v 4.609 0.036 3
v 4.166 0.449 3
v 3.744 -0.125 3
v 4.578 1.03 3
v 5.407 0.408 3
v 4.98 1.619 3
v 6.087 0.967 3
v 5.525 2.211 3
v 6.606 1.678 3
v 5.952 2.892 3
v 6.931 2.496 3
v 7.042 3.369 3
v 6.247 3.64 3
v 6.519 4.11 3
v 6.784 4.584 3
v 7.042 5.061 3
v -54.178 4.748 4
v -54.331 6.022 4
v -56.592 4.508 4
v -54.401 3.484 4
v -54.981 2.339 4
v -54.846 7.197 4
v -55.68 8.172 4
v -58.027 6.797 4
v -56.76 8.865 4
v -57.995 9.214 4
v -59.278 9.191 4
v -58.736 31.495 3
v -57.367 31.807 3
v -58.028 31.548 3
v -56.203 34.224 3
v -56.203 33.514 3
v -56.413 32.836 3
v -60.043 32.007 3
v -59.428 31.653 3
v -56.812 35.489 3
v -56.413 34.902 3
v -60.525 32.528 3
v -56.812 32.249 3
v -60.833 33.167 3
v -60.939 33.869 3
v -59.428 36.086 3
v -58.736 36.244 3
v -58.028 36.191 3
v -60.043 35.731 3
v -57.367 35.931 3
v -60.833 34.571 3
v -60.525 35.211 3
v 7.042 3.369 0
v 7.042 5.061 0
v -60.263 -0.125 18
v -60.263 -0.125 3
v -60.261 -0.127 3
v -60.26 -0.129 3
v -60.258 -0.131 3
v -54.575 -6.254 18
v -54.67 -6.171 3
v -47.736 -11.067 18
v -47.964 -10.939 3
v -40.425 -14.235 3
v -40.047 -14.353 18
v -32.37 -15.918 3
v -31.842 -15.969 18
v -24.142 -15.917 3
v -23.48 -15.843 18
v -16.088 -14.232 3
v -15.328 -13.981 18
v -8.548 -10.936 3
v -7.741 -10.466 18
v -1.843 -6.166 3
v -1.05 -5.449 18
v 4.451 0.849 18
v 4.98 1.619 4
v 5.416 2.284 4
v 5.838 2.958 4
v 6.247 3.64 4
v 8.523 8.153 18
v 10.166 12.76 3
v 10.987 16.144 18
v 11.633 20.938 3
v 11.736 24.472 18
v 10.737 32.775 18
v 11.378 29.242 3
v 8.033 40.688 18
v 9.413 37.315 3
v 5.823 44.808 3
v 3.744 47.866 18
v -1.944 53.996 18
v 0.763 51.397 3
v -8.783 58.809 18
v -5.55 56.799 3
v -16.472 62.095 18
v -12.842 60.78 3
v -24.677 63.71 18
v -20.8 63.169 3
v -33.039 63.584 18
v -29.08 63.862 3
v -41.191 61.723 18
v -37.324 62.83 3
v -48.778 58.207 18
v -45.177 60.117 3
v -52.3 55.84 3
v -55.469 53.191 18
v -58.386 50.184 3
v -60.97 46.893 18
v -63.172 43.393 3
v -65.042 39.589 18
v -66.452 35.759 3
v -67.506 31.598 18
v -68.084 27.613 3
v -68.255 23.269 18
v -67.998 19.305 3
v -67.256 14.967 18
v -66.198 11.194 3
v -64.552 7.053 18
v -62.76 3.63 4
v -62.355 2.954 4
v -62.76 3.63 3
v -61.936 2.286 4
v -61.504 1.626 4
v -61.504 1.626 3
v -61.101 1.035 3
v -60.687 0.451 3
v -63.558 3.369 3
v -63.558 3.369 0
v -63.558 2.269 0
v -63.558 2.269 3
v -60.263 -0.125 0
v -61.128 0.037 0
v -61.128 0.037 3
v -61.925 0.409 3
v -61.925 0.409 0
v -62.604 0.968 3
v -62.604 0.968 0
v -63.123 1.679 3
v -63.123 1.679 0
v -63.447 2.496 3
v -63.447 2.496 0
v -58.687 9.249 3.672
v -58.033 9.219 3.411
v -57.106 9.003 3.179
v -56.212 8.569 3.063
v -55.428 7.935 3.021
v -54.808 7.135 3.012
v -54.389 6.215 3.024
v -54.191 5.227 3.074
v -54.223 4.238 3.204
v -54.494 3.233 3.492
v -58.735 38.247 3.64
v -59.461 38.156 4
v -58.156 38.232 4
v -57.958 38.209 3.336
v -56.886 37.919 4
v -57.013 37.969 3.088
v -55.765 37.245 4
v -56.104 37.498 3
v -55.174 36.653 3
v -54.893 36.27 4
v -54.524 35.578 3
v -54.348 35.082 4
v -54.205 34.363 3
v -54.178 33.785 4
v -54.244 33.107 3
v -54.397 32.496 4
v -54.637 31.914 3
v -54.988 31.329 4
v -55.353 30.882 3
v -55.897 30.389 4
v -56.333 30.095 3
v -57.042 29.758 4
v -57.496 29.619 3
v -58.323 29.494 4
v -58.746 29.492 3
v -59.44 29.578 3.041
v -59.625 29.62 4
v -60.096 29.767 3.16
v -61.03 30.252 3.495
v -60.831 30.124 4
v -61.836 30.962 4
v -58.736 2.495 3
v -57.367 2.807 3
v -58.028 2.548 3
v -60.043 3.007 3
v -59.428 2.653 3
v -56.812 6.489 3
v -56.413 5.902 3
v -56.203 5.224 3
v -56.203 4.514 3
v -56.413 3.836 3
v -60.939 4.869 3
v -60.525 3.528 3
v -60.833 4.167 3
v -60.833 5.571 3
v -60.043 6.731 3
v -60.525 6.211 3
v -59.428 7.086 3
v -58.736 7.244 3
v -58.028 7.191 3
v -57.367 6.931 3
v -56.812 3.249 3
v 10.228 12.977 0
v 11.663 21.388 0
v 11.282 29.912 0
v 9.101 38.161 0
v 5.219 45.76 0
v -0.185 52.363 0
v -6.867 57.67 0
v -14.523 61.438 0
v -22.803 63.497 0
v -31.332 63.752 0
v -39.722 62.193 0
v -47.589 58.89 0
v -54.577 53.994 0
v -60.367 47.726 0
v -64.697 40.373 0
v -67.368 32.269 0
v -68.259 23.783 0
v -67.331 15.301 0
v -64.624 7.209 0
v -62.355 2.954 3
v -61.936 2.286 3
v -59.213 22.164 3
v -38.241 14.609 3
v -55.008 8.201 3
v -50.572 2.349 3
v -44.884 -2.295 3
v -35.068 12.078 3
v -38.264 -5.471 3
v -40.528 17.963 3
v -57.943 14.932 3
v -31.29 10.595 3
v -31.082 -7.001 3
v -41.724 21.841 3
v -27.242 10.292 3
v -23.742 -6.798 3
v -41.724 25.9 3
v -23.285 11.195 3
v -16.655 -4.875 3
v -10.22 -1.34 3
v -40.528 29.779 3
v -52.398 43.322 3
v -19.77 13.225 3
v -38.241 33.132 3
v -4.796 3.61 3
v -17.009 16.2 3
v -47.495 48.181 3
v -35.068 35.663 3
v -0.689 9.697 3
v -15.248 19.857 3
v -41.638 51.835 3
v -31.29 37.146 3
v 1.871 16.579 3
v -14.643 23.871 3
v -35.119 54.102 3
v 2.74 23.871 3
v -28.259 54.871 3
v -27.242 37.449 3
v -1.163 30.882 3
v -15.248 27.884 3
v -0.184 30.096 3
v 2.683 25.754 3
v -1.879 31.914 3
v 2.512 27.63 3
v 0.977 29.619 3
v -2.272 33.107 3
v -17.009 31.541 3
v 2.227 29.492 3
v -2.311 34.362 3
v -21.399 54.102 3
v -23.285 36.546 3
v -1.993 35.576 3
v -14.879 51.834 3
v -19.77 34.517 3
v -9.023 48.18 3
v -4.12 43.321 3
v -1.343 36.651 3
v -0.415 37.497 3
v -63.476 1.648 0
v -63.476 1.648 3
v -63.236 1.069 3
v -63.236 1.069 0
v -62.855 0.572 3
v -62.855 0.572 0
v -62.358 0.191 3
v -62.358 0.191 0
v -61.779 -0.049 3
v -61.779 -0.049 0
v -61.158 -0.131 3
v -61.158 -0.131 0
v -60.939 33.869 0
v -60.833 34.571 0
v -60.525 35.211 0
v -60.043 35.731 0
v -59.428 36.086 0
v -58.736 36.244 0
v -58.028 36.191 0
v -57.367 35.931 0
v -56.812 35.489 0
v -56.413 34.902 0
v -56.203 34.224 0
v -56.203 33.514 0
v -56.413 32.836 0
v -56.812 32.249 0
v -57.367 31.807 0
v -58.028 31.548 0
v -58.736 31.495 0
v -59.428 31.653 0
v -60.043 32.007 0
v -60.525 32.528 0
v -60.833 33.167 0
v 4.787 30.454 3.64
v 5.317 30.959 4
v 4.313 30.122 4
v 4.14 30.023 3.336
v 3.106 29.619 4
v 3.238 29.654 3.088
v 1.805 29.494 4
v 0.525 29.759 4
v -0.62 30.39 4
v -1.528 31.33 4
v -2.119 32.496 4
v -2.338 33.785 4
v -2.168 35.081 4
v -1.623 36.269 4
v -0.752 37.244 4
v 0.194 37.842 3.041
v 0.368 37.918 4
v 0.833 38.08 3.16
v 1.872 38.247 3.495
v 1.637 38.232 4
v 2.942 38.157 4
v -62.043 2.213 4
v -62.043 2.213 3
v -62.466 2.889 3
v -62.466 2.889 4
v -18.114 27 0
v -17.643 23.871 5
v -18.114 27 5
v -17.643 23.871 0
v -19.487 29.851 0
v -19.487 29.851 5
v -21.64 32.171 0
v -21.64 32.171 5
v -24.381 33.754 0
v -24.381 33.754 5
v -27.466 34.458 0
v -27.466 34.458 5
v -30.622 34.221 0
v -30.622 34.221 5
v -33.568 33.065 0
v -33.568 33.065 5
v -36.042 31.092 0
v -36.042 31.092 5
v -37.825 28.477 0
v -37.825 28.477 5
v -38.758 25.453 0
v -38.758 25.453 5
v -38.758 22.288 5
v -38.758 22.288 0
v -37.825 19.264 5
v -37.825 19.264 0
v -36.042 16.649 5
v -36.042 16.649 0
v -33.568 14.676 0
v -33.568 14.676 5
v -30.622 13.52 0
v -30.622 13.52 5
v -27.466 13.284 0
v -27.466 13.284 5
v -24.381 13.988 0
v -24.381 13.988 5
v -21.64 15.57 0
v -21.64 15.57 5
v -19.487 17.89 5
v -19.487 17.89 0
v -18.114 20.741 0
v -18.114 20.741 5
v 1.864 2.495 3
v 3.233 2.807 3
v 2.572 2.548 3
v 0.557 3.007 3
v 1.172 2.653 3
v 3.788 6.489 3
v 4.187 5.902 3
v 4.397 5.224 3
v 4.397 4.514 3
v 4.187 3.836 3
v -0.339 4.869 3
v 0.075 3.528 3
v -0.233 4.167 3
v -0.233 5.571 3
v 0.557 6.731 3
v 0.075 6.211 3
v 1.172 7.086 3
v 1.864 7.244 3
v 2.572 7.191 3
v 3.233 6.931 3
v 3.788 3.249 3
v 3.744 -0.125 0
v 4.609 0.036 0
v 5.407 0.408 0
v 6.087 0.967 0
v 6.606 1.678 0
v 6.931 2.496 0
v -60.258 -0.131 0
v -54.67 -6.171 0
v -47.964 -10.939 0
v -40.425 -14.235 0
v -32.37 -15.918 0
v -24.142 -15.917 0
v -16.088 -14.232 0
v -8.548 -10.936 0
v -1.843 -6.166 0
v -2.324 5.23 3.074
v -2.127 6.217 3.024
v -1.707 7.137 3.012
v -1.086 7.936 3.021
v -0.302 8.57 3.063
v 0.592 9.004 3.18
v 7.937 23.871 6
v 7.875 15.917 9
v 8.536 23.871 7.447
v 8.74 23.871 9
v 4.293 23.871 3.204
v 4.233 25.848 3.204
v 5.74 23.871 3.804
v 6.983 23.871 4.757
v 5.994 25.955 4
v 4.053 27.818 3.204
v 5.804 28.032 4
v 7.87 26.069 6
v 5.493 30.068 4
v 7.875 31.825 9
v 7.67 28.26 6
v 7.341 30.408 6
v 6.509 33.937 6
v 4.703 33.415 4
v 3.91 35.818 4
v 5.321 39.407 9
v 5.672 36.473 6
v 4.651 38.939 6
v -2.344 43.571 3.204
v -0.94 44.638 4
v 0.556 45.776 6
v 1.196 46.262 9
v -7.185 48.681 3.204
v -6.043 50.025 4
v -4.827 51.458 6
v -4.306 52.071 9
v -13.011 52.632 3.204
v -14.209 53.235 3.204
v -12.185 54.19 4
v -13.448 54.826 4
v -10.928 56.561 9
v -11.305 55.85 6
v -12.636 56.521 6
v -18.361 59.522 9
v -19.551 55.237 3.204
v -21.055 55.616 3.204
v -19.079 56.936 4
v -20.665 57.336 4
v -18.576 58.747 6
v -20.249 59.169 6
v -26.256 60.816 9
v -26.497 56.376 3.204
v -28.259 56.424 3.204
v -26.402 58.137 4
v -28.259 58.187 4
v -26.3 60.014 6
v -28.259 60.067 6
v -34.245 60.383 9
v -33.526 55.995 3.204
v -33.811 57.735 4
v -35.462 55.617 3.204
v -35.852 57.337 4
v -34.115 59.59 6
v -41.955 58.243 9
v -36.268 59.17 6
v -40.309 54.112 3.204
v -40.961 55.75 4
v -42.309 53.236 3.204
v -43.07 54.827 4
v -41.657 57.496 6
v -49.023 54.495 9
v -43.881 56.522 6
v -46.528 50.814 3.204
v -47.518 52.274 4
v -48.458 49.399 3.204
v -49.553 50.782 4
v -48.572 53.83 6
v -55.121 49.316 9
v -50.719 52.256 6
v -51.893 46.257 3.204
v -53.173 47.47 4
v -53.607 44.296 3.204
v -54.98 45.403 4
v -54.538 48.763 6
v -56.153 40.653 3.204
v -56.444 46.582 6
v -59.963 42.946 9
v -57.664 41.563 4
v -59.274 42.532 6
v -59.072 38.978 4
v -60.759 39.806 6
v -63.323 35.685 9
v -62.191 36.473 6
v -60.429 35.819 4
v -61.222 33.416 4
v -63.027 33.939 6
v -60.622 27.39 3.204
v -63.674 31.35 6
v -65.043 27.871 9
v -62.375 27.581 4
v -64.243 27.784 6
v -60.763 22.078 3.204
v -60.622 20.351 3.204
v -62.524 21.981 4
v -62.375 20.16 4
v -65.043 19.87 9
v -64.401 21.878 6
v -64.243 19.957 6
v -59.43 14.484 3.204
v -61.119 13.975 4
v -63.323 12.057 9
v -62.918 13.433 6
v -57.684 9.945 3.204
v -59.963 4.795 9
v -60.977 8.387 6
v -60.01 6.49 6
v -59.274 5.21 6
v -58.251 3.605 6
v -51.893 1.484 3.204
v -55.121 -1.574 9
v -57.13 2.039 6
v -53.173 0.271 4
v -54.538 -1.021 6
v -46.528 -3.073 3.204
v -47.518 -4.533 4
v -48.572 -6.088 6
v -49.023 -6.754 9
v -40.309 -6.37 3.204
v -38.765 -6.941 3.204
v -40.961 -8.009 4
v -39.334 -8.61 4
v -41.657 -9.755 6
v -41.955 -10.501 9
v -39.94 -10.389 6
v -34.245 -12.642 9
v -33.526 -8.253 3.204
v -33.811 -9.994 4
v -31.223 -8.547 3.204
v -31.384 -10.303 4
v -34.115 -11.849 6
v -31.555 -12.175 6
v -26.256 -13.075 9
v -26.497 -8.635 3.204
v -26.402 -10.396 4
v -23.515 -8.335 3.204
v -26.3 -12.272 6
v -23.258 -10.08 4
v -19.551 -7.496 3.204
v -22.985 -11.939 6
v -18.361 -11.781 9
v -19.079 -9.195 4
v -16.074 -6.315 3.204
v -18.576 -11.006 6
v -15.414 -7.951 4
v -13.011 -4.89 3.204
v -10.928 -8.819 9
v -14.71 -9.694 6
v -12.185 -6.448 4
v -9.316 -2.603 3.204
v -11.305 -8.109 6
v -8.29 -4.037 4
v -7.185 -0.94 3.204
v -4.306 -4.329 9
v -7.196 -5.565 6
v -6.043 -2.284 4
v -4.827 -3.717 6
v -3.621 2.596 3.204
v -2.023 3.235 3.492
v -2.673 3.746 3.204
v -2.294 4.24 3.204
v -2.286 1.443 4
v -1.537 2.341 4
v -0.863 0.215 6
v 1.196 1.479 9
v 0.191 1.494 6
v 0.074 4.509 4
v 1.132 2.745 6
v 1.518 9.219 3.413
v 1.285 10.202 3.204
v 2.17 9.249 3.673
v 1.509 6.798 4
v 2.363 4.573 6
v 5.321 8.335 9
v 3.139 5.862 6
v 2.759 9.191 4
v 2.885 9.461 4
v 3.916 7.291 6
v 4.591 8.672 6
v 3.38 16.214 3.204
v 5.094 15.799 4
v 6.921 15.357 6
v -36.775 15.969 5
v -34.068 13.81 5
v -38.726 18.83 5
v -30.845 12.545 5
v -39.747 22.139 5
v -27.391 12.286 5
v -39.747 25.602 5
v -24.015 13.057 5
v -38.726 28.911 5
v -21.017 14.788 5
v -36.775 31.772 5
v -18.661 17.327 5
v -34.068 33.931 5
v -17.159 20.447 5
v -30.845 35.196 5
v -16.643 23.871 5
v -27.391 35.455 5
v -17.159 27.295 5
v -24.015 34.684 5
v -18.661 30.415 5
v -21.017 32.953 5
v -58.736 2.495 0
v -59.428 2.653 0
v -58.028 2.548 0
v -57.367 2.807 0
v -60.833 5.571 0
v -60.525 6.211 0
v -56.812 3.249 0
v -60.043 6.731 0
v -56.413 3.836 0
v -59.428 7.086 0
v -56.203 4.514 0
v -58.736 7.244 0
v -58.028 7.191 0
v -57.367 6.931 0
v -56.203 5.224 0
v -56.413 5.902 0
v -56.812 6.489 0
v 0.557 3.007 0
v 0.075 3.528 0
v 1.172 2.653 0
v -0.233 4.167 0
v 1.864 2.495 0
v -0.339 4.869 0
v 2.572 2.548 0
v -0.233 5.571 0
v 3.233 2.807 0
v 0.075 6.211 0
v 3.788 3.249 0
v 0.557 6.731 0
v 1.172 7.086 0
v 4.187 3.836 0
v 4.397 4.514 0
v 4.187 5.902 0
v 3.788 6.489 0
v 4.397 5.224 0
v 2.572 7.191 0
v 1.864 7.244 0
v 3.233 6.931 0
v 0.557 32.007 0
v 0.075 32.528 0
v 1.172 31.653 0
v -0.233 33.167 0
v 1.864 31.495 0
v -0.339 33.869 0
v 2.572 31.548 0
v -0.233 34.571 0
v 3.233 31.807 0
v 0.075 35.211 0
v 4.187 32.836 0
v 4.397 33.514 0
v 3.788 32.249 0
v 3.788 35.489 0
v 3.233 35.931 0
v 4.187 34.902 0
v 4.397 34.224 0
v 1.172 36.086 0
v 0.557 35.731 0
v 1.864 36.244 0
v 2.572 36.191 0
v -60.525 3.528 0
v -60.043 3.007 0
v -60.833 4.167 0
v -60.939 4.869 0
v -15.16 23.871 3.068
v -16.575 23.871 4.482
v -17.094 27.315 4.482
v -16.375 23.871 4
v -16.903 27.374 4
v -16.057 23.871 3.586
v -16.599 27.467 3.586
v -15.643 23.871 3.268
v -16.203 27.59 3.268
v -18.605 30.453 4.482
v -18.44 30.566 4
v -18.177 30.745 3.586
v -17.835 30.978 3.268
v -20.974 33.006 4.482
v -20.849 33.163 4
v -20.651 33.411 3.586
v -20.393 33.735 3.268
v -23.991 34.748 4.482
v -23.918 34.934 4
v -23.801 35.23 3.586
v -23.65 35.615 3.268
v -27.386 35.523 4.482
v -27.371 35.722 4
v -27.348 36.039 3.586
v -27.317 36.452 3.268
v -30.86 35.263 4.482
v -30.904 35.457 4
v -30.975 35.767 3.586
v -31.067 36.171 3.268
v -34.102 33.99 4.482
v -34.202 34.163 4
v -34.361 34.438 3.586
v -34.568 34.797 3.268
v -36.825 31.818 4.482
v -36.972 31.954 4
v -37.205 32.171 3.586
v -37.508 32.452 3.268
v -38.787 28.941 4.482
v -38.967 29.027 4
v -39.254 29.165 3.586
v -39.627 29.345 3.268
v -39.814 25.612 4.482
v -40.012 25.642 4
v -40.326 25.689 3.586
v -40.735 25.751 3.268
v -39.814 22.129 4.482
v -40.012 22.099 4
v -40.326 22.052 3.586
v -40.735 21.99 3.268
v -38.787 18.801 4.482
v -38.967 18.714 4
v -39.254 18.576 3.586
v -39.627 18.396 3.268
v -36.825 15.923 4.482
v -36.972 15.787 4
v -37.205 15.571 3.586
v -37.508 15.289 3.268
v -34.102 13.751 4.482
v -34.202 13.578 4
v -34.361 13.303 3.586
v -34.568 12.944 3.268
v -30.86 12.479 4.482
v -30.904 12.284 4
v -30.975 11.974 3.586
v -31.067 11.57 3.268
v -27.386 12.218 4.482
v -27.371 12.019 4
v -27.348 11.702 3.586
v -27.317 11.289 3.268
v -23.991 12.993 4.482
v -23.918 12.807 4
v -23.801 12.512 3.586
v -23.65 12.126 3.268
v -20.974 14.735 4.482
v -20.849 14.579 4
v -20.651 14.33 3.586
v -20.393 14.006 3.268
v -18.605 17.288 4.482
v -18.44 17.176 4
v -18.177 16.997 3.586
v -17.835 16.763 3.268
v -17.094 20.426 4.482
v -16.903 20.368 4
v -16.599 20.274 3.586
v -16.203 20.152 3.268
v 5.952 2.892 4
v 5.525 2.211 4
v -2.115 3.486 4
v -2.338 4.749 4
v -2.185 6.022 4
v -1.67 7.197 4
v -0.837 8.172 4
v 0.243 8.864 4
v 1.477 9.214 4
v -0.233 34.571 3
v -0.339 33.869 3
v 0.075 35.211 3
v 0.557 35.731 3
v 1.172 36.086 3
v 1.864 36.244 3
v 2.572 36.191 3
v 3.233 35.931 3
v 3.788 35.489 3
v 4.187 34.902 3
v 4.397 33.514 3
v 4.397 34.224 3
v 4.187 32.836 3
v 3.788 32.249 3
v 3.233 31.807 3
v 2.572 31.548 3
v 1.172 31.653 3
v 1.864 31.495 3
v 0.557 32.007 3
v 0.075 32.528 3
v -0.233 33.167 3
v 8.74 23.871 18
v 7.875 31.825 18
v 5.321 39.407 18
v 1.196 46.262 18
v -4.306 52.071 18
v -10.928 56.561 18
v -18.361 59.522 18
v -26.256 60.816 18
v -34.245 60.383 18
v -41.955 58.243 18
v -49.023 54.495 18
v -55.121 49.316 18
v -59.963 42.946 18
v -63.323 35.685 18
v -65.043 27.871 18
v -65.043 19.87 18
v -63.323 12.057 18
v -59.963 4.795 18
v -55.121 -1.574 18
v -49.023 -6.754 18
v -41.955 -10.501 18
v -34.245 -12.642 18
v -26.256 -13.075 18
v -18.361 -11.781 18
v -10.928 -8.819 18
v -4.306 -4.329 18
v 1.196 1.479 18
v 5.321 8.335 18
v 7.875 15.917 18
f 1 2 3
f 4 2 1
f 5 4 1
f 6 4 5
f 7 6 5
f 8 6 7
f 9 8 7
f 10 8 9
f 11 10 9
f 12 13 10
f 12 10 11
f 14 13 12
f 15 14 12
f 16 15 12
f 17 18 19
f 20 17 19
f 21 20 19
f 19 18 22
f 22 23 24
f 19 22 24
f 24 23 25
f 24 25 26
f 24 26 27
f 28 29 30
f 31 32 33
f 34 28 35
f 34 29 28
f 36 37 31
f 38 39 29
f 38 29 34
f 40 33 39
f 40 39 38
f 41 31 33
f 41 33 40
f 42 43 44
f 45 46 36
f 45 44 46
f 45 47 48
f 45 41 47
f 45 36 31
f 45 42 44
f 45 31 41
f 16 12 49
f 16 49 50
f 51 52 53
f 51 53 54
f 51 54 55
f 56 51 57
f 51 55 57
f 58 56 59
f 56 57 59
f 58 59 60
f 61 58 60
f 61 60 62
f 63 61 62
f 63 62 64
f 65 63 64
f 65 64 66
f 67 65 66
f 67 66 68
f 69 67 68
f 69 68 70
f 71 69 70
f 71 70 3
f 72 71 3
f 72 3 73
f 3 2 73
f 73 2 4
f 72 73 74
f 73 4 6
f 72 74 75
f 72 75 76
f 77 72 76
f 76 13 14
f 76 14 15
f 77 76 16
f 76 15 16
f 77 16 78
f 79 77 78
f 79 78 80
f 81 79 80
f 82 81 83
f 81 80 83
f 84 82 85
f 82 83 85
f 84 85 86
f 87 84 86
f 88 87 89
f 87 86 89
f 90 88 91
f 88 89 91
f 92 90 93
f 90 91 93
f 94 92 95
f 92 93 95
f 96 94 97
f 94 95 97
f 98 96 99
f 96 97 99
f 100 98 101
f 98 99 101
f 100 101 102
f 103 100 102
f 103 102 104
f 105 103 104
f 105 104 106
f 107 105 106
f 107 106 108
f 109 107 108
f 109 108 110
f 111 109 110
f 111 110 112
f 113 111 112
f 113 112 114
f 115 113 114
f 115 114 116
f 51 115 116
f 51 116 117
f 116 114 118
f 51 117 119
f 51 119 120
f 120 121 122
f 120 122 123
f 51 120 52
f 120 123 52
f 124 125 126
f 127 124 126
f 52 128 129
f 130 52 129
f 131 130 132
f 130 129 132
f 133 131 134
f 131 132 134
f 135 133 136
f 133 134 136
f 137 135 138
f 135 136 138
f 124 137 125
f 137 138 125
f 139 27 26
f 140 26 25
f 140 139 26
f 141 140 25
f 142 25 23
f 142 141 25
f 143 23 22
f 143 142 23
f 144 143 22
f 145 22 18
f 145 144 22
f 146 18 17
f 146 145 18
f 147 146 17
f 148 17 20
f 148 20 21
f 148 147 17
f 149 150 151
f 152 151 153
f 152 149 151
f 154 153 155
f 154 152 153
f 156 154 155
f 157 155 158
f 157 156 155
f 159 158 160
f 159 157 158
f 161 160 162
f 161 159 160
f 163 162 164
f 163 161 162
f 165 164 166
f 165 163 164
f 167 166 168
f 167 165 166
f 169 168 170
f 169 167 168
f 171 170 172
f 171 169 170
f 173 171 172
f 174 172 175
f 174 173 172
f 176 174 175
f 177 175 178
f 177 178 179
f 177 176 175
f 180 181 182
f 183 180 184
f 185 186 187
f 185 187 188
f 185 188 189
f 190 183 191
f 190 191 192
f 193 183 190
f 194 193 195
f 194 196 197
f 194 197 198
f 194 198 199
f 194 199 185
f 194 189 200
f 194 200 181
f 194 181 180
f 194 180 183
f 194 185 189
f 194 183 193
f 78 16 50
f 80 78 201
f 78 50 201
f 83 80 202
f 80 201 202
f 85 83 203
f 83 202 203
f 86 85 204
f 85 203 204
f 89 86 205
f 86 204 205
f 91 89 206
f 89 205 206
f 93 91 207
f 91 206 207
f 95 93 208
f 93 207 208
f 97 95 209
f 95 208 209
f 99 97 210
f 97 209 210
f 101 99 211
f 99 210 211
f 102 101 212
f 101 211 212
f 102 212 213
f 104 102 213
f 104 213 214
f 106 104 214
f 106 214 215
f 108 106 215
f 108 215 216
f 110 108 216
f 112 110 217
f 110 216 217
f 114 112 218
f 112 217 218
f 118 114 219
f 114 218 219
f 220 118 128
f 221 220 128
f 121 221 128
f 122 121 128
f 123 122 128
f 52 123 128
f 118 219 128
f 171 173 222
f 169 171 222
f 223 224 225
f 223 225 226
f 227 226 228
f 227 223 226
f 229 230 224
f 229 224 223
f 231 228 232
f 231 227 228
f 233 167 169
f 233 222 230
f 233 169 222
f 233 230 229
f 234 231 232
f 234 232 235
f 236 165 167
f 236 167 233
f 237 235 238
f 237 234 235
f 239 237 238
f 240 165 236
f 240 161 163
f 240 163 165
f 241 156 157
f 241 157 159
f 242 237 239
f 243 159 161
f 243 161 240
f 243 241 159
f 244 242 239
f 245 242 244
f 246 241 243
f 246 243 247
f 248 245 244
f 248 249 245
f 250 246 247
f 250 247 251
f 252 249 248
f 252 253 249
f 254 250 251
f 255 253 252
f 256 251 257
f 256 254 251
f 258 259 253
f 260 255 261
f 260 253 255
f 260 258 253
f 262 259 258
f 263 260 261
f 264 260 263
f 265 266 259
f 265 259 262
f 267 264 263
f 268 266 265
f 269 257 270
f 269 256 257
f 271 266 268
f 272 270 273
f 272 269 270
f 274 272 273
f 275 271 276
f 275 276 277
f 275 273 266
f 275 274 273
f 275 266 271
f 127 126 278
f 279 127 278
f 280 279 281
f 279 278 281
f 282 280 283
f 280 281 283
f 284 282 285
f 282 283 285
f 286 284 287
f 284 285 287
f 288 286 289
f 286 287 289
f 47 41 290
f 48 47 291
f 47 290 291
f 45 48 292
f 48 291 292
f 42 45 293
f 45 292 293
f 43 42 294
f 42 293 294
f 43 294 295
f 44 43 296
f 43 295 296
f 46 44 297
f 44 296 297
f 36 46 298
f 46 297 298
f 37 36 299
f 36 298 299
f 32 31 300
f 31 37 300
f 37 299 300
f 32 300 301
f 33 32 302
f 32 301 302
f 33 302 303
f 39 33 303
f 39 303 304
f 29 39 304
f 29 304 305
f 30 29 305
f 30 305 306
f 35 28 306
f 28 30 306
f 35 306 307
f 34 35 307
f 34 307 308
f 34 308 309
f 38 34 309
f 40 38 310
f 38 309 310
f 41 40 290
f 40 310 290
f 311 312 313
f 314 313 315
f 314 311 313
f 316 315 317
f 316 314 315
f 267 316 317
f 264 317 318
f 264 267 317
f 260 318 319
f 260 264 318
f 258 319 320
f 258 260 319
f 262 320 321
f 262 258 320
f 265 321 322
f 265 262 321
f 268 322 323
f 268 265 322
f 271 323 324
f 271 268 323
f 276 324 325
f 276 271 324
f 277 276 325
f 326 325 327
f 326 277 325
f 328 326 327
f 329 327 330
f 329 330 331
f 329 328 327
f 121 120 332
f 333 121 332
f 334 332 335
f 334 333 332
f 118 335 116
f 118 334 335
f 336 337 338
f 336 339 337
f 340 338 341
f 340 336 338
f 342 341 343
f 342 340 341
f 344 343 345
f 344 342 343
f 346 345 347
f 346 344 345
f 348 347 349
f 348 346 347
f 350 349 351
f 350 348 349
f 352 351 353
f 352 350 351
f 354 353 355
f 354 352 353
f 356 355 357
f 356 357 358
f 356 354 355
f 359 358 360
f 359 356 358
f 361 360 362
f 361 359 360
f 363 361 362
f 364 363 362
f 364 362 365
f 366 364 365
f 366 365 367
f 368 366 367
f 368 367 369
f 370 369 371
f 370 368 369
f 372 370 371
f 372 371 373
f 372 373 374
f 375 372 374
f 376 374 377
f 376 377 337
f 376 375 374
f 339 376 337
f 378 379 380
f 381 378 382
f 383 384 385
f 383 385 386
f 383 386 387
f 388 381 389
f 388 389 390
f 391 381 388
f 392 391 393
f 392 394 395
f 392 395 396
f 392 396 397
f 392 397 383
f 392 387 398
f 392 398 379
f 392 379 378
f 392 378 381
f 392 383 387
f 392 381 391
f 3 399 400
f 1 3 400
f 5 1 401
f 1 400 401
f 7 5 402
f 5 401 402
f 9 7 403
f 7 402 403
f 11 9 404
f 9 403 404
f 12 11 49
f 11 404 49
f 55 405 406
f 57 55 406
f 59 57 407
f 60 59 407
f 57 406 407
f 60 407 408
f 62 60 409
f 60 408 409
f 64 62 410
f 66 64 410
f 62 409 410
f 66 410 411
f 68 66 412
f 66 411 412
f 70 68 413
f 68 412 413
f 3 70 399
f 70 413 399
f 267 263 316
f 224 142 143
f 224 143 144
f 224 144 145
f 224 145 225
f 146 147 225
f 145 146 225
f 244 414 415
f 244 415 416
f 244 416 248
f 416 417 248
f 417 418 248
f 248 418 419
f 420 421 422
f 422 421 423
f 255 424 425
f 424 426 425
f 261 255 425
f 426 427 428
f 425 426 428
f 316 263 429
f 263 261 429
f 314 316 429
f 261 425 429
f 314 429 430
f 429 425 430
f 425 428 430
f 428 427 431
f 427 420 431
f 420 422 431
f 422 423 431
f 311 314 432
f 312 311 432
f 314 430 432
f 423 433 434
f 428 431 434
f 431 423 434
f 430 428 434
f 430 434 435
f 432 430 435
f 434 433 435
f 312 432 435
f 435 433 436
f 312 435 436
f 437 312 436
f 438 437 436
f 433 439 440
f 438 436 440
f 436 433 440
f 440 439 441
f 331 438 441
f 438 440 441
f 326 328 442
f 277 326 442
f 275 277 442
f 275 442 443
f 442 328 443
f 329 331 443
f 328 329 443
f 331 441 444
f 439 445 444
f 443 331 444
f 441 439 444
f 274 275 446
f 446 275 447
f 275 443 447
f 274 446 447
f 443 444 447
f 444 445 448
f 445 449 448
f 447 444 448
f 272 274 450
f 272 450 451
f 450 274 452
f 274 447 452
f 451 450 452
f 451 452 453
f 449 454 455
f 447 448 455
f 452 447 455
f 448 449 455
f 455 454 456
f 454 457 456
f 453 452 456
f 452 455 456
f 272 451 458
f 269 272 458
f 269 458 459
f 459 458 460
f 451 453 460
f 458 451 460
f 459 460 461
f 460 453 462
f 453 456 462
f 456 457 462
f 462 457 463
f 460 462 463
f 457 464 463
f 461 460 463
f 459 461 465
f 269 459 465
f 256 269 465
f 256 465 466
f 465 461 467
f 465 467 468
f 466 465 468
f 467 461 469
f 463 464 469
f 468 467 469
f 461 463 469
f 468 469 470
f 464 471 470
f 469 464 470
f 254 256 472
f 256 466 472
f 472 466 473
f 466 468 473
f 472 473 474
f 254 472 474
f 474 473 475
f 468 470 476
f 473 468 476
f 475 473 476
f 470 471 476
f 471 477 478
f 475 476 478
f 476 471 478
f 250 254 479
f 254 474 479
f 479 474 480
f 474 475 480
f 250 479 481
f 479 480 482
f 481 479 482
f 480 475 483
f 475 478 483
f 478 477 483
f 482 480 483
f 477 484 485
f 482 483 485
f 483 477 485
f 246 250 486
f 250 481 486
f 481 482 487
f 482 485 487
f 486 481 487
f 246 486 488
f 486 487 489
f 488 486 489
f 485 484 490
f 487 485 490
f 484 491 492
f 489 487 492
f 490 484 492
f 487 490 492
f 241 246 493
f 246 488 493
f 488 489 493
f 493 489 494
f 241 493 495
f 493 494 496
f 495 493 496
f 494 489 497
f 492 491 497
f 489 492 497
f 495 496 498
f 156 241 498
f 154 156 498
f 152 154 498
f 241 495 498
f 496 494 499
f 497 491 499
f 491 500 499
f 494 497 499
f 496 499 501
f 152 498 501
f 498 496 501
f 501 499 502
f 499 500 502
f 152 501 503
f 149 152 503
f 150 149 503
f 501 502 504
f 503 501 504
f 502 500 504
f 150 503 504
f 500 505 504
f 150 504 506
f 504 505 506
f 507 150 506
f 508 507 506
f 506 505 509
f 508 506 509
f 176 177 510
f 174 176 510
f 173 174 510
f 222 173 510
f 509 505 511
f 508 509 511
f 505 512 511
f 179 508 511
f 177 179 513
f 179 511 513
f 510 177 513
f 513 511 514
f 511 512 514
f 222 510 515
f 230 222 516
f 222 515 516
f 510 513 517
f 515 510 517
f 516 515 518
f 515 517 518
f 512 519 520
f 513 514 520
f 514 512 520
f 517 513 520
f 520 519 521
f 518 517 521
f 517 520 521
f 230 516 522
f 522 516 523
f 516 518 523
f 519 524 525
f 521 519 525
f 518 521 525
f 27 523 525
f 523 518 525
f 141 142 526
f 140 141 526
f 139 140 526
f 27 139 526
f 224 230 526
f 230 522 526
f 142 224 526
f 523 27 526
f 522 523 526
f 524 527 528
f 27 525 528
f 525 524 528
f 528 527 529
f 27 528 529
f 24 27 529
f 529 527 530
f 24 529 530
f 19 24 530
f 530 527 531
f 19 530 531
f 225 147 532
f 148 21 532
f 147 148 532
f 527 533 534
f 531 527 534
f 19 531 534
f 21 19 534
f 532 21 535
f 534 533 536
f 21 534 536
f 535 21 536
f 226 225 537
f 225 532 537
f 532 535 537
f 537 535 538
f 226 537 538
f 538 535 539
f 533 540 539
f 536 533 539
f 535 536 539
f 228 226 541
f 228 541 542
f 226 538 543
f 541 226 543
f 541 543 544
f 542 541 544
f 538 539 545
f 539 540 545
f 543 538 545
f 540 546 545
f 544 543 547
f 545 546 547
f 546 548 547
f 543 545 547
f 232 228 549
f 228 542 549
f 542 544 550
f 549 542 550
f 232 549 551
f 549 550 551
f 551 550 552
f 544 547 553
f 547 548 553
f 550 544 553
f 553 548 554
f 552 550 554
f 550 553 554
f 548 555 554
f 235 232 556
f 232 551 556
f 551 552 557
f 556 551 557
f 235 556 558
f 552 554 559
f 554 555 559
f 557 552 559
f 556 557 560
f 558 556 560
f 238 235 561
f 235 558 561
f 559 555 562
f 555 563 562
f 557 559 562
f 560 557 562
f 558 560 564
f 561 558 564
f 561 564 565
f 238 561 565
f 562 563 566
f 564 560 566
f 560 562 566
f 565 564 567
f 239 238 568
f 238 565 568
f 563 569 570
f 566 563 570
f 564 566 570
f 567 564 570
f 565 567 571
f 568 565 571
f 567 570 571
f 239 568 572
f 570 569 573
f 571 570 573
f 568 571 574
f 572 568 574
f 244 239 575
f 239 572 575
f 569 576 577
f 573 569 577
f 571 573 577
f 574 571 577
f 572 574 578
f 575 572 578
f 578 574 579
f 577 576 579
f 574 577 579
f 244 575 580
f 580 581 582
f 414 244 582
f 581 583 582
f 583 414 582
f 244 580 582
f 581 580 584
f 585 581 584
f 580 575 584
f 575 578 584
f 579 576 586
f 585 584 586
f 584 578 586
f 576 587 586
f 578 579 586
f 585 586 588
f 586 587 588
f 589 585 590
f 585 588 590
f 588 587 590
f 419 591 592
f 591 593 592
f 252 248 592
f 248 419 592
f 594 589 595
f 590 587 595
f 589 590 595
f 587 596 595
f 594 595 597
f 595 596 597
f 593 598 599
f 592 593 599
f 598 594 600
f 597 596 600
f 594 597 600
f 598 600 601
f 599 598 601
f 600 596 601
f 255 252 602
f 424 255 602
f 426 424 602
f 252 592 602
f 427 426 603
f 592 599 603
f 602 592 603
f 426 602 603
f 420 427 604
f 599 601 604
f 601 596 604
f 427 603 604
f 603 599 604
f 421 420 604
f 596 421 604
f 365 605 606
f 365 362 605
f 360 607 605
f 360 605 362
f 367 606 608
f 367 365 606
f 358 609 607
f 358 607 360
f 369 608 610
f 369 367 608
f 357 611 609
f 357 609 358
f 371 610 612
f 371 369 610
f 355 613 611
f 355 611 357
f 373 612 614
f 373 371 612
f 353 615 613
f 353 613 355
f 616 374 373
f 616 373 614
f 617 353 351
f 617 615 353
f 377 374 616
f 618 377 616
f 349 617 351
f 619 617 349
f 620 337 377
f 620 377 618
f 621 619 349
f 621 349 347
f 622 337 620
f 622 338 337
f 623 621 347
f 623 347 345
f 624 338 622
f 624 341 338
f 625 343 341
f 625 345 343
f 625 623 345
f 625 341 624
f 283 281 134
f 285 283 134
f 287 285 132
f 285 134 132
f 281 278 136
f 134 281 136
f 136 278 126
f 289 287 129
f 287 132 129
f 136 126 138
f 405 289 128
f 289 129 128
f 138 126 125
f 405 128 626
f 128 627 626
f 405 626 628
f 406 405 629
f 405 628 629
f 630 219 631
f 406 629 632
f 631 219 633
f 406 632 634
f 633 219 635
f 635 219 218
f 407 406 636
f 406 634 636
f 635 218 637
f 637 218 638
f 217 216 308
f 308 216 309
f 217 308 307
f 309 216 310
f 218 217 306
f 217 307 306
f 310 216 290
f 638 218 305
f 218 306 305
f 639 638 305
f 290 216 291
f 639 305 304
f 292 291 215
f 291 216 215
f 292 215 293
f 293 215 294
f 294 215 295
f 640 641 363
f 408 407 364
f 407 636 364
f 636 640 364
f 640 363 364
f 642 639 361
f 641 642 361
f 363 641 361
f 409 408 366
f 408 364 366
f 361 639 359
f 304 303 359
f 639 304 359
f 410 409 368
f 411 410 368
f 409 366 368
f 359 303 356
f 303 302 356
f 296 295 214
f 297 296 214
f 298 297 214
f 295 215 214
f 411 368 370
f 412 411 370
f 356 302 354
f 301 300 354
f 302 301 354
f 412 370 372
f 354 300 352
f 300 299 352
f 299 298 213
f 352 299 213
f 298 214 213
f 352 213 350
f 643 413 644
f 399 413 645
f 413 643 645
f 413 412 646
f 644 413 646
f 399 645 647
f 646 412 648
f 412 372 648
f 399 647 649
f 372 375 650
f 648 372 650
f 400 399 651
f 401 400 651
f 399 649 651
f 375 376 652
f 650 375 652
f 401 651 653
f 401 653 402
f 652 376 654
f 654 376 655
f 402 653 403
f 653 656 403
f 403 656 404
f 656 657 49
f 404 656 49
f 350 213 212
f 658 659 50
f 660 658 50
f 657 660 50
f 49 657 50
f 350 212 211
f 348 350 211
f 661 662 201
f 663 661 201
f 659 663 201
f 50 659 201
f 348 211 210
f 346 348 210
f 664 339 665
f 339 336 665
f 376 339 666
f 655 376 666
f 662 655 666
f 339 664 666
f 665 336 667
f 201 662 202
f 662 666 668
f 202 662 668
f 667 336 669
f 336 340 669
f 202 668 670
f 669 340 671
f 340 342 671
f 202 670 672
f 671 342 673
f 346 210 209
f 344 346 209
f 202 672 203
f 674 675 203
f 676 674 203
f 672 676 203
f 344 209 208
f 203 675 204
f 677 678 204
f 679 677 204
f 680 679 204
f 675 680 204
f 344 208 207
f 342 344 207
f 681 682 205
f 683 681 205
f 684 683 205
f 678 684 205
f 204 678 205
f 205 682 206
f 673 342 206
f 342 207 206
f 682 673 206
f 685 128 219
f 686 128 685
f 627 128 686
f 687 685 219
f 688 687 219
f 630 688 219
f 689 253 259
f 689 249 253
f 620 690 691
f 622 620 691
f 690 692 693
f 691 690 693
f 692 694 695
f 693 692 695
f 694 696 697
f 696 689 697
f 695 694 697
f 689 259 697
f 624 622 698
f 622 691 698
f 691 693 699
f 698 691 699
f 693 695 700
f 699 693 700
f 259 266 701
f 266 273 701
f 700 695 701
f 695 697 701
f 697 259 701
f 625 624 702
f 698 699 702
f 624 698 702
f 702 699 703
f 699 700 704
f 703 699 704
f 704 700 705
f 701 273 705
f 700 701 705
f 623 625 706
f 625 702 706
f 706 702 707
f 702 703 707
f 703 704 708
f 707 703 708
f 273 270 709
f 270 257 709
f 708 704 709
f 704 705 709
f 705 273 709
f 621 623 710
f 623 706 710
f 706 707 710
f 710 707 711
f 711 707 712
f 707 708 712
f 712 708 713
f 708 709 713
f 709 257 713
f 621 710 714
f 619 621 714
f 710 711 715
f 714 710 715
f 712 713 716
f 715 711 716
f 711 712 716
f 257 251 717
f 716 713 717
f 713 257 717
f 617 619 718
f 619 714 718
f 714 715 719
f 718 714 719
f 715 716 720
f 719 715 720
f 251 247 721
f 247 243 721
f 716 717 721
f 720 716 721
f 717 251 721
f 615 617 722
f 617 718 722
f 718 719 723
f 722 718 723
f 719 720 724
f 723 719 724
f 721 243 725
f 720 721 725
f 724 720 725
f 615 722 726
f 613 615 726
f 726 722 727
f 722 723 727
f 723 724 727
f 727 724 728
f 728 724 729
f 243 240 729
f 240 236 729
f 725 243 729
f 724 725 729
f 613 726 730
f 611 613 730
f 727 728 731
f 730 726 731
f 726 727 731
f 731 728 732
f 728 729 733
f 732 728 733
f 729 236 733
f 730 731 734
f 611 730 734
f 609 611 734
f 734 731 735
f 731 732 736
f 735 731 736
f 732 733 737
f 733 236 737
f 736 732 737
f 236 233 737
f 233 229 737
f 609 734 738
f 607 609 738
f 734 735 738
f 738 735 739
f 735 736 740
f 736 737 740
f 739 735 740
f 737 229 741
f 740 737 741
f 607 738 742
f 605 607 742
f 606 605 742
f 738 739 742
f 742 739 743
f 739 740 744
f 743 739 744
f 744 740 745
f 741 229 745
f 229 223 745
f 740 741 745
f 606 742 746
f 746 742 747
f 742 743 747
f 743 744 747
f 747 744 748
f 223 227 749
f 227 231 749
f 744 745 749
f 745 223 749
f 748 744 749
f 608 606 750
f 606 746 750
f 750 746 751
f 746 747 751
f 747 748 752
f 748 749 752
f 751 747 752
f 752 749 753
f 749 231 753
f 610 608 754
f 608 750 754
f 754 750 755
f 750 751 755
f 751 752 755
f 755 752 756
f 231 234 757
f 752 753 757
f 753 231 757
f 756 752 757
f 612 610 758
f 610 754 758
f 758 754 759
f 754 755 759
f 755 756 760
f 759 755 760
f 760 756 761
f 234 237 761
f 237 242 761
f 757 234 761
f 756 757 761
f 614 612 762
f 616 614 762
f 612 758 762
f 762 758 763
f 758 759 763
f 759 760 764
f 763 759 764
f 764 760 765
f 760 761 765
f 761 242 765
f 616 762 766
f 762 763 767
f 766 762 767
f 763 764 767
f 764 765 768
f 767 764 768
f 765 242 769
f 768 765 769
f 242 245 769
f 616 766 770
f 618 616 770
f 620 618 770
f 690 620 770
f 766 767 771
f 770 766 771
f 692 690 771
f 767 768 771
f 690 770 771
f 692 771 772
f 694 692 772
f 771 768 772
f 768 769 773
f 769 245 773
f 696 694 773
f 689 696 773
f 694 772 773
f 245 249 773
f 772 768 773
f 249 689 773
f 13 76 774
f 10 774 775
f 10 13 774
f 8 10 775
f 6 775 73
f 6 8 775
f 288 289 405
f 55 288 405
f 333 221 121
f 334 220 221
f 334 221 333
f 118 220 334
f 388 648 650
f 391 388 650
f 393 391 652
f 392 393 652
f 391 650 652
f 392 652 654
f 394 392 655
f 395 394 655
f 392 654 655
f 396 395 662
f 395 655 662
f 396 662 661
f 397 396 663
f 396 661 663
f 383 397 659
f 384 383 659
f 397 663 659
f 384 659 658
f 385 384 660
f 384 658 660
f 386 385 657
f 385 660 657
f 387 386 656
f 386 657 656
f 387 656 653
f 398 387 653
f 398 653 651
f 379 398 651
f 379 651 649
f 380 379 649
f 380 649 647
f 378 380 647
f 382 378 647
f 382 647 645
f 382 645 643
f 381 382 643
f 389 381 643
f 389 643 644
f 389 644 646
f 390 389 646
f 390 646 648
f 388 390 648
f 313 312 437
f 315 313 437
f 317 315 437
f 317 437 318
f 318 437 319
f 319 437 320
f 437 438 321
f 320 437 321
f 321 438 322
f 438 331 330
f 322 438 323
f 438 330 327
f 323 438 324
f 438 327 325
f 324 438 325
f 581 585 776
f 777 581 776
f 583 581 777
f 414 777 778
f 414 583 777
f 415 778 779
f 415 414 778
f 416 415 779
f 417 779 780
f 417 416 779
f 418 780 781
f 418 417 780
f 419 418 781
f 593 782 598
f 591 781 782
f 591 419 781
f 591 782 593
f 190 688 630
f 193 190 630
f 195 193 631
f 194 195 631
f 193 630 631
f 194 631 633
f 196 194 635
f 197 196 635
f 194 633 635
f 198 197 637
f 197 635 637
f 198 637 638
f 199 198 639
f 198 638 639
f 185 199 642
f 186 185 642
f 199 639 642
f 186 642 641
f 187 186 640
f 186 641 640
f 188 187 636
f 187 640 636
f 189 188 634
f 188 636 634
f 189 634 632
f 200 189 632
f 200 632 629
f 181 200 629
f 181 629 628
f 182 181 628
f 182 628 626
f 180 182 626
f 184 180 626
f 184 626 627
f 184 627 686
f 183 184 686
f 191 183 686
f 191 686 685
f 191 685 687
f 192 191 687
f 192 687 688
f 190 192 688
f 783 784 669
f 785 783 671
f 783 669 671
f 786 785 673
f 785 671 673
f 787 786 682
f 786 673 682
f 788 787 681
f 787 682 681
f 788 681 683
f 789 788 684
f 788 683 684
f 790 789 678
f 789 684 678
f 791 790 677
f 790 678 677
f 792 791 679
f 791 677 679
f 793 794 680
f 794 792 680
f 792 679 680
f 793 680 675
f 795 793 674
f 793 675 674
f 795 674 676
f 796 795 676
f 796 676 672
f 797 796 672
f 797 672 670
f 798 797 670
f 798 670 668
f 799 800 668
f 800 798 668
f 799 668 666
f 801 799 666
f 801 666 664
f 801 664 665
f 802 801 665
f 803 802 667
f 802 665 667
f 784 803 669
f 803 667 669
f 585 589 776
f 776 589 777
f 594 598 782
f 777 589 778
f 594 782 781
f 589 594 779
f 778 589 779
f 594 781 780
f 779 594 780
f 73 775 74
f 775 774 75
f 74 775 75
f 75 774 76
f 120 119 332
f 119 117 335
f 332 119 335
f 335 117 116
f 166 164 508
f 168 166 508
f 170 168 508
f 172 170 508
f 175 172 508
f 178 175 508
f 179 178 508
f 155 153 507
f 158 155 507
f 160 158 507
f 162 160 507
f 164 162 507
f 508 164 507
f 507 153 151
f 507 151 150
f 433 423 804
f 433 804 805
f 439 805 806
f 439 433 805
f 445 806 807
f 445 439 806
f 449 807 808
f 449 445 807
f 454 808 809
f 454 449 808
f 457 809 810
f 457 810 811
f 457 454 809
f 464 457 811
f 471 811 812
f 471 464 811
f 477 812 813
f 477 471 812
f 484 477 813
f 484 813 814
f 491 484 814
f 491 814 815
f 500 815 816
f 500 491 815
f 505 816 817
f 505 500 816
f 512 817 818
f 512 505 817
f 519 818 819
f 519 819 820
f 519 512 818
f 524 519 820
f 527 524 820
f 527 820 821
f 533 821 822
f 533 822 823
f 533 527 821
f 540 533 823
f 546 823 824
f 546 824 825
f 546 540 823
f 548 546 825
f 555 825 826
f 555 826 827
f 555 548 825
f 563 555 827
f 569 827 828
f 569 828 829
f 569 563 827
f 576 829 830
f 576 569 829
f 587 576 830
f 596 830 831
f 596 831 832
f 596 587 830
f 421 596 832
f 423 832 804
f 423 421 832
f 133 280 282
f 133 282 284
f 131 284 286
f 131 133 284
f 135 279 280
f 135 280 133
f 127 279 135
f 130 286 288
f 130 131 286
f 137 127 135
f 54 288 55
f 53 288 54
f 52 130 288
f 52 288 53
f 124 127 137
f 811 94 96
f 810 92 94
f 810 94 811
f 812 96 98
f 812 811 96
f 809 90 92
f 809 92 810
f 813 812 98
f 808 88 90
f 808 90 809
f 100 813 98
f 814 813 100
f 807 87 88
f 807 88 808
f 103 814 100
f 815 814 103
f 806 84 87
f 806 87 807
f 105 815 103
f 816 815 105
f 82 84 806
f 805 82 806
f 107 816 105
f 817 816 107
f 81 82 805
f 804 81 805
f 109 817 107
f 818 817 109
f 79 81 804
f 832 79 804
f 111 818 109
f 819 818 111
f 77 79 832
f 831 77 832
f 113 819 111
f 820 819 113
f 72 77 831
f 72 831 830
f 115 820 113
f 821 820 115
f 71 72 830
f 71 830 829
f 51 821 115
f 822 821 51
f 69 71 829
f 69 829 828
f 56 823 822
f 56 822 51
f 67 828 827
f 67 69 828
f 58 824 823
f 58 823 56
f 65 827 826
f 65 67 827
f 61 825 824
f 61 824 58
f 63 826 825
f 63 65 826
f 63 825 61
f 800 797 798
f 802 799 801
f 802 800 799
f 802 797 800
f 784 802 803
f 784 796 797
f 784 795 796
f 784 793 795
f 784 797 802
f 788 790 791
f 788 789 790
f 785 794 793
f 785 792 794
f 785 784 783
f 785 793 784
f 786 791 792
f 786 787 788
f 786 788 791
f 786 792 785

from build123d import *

# Parameters (mm, degrees)
BOSS_EXTRUDE1_OUTLINE_R = 10.616834944
BOSS_EXTRUDE1_DEPTH     = 3
SKETCH3_R               = 40
SKETCH3_R_2             = 37
BOSS_EXTRUDE2_DEPTH     = 15
SKETCH4_R               = 11.616834944
SKETCH4_R_2             = 10.616834944
BOSS_EXTRUDE3_DEPTH     = 2
FILLET2_R               = 2
FILLET3_R               = 6
SKETCH6_R               = 2.38125
CUT_EXTRUDE1_DEPTH      = 3.175
SKETCH8_R               = 4.38125
BOSS_EXTRUDE5_DEPTH     = 1


# Read off the part's stored shape, not the designer's step: Boss-Extrude1
with BuildPart() as part:
    # Boss-Extrude1 outline → Boss-Extrude1 (new body)
    with BuildSketch(Plane.XY):
        with BuildLine():
            Line((-61.158014619, -0.130841154), (-60.258391765, -0.130841154))
            ThreePointArc((-60.258391765, -0.130841154), (-28.255886619, -16.129333036), (3.743709339, -0.125023097))
            ThreePointArc((3.743709339, -0.125023097), (6.087180251, 0.966663669), (7.041985381, 3.369158846))
            Line((7.041985381, 3.369158846), (7.041985381, 5.061001168))
            ThreePointArc((7.041985381, 5.061001168), (-31.332414811, 63.752458818), (-60.262892503, -0.124839588))
            ThreePointArc((-60.262892503, -0.124839588), (-62.604293531, 0.967812618), (-63.558014619, 3.369158846))
            Line((-63.558014619, 3.369158846), (-63.558014619, 2.269158846))
            ThreePointArc((-63.558014619, 2.269158846), (-62.855070894, 0.572102571), (-61.158014619, -0.130841154))
        make_face()
        with Locations((-28.259522786, 23.870666799)):
            Circle(BOSS_EXTRUDE1_OUTLINE_R, mode=Mode.SUBTRACT)
    extrude(amount=BOSS_EXTRUDE1_DEPTH)

    # Sketch3 → Boss-Extrude2 (add)
    with BuildSketch(Plane.XY.offset(3)):
        with Locations(Location((-28.259522786, 23.870666799, 0), (0, 0, 216.861852286))):
            Circle(SKETCH3_R)
        with Locations((-28.259522786, 23.870666799)):
            Circle(SKETCH3_R_2, mode=Mode.SUBTRACT)
    extrude(amount=BOSS_EXTRUDE2_DEPTH)

    # Sketch4 → Boss-Extrude3 (add)
    with BuildSketch(Plane.XY.offset(3)):
        with Locations((-28.259522786, 23.870666799)):
            Circle(SKETCH4_R)
        with Locations((-28.259522786, 23.870666799)):
            Circle(SKETCH4_R_2, mode=Mode.SUBTRACT)
    extrude(amount=BOSS_EXTRUDE3_DEPTH)

    # Fillet2
    fillet2_edges = [part.edges().sort_by_distance(p)[0] for p in [
        (-39.87635773, 23.870666799, 3),
    ]]
    fillet(fillet2_edges, radius=FILLET2_R - 0.0001)  # a hair under: the kernel refuses the full size

    # Fillet3
    fillet3_edges = [part.edges().sort_by_distance(p)[0] for p in [
        (-65.259522786, 23.870666799, 3),
    ]]
    fillet(fillet3_edges, radius=FILLET3_R)

    # Sketch6 → Cut-Extrude1 (cut)
    with BuildSketch(Plane(origin=(0, 0, 0), x_dir=(-1, 0, 0), z_dir=(0, 0, -1))):
        with Locations((58.558014619, 4.869158846)):
            Circle(SKETCH6_R)
        with Locations((58.558014619, 33.869158846)):
            Circle(SKETCH6_R)
        with Locations((-2.041985381, 33.869158846)):
            Circle(SKETCH6_R)
        with Locations((-2.041985381, 4.869158846)):
            Circle(SKETCH6_R)
    extrude(amount=-CUT_EXTRUDE1_DEPTH, mode=Mode.SUBTRACT)

    # Sketch8 → Boss-Extrude5 (add)
    with BuildSketch(Plane(origin=(0, 0, 3), x_dir=(-1, 0, 0), z_dir=(0, 0, -1))):
        with Locations((58.558014619, 4.869158846)):
            Circle(SKETCH8_R)
        with Locations((58.558014619, 33.869158846)):
            Circle(SKETCH8_R)
        with Locations((-2.041985381, 33.869158846)):
            Circle(SKETCH8_R)
        with Locations((-2.041985381, 4.869158846)):
            Circle(SKETCH8_R)
    extrude(amount=-BOSS_EXTRUDE5_DEPTH)


solid = part.part
